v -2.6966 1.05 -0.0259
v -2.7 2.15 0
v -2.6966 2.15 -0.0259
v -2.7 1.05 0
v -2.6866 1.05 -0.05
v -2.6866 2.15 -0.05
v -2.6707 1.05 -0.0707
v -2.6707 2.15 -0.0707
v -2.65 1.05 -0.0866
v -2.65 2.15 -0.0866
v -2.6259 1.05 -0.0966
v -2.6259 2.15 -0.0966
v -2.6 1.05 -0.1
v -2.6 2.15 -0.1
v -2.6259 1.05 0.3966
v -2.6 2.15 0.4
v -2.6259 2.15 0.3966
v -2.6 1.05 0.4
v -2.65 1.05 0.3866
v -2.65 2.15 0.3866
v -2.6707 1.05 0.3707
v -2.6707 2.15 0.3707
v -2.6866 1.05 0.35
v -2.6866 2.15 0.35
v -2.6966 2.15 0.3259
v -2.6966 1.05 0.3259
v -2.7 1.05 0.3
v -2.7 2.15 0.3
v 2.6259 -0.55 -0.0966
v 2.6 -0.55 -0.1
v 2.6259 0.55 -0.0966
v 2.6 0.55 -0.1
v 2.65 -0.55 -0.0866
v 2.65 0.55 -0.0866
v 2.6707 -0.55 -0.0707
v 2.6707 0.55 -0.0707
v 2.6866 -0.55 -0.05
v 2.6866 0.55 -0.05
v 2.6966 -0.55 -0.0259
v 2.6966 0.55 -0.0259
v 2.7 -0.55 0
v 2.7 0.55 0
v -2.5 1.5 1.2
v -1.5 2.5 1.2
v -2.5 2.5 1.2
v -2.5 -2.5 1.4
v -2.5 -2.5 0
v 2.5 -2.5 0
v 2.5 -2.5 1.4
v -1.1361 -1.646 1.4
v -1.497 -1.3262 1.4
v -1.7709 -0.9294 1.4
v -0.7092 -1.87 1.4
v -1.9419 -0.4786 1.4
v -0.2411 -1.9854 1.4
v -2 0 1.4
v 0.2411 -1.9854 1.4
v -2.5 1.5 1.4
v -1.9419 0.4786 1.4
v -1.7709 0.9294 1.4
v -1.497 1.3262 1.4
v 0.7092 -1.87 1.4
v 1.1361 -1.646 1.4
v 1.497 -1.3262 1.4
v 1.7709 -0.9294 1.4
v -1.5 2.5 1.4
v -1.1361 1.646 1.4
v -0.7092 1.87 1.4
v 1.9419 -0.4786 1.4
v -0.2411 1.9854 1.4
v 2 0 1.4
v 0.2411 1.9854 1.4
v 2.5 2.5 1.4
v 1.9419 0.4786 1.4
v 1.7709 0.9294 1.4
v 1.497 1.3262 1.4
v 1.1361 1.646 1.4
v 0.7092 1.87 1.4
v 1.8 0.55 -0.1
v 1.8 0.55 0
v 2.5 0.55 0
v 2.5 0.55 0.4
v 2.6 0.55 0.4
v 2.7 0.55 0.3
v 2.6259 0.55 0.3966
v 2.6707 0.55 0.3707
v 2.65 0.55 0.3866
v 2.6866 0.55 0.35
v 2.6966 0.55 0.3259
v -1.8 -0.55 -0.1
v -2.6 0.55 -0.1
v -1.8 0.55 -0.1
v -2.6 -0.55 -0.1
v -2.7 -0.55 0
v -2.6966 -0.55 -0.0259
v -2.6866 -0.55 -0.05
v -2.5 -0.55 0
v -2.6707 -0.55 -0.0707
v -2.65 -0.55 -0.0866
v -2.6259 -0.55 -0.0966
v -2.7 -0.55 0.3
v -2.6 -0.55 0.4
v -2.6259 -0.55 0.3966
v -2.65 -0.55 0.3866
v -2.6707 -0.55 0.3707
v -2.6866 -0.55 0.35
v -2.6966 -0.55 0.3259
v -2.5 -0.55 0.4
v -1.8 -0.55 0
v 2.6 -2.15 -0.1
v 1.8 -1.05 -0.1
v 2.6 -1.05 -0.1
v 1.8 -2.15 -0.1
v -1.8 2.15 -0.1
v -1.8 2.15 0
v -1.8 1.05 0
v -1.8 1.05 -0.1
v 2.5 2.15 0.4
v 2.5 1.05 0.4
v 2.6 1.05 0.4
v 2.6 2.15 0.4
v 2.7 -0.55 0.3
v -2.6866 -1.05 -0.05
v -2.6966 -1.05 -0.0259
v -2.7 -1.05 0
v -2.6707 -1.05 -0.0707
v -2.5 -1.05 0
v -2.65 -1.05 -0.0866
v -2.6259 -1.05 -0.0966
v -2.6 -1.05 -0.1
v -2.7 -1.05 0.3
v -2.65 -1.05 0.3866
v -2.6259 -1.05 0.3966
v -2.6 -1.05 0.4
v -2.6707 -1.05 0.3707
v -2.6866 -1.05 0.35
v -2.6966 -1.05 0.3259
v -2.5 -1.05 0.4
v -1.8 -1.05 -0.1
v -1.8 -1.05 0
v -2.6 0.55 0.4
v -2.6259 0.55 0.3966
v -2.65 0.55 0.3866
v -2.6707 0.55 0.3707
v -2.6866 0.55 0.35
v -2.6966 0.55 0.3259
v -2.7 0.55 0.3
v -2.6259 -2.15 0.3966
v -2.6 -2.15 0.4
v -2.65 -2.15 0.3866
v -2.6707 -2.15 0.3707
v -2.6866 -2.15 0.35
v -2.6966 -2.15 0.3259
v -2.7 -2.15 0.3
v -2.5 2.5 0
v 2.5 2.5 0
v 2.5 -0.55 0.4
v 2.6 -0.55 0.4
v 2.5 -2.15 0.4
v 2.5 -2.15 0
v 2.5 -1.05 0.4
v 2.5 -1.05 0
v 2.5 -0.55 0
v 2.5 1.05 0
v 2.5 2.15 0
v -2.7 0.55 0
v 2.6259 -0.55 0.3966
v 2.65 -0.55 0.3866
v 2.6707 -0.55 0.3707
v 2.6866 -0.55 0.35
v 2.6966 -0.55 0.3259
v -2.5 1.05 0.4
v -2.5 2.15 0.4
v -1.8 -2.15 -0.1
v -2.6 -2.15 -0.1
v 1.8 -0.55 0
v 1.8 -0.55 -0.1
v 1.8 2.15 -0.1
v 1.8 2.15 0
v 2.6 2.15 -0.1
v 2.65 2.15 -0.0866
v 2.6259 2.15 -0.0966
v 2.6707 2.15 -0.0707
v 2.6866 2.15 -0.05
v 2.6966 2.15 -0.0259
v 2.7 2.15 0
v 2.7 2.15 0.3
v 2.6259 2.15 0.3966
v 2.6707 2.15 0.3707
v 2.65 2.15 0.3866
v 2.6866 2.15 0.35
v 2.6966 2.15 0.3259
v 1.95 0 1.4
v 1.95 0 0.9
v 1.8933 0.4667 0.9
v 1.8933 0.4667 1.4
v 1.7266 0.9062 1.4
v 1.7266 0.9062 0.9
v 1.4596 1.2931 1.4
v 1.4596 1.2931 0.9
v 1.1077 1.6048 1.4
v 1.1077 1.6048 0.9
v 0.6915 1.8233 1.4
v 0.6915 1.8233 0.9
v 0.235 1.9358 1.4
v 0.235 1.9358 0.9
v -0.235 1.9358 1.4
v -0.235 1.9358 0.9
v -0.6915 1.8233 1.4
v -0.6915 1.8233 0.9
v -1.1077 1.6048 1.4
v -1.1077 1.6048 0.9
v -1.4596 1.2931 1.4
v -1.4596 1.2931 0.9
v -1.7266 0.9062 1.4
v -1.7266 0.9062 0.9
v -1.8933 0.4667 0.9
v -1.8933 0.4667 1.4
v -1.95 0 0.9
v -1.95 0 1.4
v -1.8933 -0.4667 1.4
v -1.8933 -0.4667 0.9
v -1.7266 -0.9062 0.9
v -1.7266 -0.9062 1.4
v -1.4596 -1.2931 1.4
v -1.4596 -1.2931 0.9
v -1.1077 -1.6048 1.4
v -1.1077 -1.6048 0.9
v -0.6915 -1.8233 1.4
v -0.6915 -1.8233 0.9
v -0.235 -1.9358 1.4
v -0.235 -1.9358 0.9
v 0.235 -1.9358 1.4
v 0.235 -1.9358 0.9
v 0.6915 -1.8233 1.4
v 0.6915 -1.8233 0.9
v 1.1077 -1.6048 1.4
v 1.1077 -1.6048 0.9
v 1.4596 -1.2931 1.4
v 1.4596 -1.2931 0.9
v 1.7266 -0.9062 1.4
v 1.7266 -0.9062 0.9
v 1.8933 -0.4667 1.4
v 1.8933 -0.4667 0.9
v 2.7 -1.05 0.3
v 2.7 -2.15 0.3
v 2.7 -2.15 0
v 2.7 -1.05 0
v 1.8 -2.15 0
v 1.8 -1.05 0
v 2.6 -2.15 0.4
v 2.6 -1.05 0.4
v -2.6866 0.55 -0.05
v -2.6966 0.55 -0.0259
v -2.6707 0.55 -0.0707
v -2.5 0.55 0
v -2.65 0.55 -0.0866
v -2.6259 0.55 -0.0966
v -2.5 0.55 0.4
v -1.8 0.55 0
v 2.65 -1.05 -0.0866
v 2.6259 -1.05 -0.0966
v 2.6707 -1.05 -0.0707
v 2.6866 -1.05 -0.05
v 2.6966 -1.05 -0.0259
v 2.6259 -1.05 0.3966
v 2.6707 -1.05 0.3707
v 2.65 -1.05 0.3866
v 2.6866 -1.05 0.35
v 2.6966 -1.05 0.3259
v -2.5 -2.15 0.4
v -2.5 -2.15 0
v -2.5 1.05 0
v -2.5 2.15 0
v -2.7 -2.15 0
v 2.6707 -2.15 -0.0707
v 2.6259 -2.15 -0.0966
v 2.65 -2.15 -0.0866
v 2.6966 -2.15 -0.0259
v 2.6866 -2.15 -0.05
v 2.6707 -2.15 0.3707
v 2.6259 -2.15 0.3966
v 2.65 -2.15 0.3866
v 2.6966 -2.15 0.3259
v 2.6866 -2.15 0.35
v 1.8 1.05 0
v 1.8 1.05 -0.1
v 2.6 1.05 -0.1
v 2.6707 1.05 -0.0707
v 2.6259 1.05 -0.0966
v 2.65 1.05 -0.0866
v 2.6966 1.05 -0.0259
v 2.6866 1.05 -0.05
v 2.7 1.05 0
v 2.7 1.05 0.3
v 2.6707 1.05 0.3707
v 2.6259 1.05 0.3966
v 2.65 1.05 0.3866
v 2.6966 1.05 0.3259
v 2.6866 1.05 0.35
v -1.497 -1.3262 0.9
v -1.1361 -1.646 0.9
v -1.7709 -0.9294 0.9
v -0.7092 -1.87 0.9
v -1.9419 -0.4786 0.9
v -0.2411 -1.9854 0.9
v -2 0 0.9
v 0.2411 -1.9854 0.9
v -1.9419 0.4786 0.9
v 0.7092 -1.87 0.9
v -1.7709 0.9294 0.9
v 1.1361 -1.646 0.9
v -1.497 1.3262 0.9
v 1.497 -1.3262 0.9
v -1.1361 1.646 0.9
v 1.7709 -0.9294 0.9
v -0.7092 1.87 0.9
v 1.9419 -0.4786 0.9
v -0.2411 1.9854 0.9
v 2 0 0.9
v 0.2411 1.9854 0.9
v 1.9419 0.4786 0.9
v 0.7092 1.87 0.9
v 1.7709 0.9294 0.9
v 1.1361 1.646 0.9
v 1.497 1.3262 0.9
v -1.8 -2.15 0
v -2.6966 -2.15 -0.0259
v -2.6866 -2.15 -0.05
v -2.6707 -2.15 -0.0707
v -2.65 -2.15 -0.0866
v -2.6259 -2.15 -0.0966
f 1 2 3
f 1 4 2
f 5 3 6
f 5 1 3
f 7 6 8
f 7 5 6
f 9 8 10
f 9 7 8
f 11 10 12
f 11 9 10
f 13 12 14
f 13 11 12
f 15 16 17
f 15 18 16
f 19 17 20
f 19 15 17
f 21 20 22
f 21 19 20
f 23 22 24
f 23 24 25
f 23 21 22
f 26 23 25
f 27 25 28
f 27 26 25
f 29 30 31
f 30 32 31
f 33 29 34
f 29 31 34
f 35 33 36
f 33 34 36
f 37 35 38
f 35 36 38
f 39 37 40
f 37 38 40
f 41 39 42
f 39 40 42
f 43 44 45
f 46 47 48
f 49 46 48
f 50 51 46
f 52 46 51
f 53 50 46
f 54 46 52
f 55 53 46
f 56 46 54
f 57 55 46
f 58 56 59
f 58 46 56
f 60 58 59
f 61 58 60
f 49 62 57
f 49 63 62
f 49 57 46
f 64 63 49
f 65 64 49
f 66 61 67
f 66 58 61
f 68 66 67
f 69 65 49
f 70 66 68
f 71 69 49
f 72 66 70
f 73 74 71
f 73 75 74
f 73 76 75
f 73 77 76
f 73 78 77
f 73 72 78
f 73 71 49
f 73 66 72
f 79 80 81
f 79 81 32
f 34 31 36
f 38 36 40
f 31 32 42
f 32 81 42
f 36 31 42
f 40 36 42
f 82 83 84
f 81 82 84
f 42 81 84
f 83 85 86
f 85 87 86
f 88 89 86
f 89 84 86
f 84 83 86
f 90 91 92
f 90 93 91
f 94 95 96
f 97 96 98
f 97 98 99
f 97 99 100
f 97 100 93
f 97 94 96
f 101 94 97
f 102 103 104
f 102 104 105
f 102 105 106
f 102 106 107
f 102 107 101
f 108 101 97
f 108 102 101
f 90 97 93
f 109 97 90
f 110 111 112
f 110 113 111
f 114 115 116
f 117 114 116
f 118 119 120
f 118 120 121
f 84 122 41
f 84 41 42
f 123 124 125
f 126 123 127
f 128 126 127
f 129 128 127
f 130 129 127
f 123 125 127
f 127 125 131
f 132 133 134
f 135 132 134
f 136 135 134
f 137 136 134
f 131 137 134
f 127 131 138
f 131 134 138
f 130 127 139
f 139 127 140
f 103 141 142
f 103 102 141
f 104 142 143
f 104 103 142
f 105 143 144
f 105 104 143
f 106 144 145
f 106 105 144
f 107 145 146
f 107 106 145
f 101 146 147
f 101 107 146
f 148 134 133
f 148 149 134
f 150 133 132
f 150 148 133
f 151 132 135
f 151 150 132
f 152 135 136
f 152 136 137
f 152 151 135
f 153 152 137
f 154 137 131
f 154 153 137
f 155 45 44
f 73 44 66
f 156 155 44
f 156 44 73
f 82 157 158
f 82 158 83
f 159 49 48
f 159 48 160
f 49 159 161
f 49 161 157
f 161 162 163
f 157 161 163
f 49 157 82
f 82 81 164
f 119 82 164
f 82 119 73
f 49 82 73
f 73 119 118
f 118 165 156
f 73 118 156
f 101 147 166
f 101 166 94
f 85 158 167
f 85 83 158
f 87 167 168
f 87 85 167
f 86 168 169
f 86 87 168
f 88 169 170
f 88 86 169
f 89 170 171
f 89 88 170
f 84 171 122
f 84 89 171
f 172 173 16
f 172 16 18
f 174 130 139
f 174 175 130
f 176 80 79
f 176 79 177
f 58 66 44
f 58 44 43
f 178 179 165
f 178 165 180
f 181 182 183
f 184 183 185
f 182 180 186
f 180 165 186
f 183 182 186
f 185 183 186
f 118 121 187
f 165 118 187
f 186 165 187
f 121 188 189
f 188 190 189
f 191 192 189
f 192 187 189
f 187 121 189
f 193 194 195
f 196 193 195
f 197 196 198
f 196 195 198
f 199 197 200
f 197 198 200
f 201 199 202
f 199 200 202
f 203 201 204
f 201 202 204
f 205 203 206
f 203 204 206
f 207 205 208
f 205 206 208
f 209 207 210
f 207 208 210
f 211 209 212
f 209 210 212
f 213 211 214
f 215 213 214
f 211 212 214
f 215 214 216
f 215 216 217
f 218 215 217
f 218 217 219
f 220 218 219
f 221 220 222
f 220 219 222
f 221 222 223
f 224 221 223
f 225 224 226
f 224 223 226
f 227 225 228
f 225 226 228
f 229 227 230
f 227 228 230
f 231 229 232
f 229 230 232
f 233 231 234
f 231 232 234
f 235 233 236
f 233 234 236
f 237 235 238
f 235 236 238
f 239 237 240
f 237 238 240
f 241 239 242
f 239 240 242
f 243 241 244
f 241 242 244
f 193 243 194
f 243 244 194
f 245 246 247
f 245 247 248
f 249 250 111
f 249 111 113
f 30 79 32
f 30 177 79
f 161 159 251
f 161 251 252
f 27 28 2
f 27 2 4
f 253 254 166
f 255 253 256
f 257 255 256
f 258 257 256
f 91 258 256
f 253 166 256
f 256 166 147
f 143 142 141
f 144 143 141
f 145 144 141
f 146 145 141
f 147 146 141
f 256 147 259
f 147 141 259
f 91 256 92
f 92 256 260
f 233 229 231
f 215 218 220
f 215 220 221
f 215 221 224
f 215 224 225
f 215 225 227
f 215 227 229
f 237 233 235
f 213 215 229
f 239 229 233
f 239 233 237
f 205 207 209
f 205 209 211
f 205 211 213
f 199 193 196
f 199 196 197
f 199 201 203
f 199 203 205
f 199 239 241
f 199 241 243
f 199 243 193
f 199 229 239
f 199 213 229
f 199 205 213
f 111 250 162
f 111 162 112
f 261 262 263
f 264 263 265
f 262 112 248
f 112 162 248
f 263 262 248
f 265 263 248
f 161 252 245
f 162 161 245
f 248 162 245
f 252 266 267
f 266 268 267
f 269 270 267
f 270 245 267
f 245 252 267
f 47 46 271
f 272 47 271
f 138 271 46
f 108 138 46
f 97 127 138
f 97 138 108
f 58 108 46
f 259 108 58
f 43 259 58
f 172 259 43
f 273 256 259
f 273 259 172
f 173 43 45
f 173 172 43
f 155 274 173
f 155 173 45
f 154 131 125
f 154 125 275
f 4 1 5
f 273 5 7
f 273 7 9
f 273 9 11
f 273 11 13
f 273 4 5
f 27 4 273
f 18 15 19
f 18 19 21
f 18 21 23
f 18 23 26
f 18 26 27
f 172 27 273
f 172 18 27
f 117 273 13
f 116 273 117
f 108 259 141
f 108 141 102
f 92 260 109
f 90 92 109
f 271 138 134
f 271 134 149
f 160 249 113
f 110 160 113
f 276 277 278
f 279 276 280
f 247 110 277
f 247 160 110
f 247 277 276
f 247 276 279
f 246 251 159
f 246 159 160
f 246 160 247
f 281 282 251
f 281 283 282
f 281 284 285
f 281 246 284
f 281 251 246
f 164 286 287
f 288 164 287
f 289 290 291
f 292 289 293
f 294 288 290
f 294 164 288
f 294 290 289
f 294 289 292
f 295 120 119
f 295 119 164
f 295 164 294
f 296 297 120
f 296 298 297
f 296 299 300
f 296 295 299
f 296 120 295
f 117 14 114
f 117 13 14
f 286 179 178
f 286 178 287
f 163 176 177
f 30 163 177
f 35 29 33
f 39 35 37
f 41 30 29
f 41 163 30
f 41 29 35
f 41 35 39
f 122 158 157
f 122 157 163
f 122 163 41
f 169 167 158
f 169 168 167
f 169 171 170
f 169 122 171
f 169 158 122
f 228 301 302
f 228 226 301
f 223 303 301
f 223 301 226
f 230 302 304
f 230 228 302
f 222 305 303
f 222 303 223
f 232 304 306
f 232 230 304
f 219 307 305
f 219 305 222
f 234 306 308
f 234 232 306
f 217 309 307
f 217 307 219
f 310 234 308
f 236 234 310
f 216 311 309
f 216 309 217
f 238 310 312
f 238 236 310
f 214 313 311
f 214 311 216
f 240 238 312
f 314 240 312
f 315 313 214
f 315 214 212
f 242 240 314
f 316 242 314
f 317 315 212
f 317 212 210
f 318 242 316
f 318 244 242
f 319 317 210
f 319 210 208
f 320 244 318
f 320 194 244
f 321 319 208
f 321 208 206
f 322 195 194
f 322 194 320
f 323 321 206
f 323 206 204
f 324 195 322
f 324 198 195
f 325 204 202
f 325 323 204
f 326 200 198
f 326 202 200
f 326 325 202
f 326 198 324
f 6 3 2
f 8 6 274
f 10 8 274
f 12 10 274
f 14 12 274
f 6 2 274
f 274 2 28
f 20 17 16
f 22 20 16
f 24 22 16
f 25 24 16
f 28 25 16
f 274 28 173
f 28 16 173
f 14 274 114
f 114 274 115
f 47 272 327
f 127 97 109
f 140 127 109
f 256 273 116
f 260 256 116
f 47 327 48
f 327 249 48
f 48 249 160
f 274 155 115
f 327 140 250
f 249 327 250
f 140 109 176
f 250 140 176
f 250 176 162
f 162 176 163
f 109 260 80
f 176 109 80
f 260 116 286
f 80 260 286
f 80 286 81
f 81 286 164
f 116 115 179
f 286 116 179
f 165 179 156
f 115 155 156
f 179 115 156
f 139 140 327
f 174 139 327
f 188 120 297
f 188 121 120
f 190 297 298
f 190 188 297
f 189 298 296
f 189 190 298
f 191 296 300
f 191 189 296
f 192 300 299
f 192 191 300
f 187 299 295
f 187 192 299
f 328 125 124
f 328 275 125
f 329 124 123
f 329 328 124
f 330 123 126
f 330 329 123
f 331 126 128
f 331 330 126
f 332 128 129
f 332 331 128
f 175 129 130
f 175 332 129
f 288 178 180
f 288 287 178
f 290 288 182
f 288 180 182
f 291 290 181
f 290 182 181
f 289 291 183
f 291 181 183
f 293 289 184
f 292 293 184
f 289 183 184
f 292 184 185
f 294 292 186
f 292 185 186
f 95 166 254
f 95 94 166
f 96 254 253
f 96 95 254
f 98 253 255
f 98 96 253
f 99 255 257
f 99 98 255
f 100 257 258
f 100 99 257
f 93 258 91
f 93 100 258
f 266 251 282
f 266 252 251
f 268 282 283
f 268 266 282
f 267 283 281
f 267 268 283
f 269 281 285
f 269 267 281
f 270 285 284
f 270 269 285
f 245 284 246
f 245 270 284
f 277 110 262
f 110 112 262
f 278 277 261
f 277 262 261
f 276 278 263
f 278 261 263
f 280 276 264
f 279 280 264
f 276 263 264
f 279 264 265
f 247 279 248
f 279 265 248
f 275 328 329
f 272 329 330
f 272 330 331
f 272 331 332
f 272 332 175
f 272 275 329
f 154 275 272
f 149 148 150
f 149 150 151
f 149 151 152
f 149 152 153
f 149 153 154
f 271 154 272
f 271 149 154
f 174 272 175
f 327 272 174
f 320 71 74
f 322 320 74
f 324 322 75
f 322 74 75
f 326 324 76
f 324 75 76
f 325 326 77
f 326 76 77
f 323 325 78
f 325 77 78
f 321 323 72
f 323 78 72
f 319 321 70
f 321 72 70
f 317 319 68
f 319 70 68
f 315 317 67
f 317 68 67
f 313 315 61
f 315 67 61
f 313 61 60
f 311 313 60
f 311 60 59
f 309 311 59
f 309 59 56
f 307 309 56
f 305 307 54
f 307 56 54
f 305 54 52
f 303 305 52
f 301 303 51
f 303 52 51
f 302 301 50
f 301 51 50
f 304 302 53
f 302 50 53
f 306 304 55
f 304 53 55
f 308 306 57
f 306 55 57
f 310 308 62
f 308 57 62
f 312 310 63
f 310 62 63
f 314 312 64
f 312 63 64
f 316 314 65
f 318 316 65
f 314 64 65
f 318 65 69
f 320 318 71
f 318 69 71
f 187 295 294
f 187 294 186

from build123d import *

# Parameters (mm, degrees)
SKETCH_W        = 5
SKETCH_H        = 5
PAD_DEPTH       = 1.4
SKETCH001_R     = 2
POCKET_DEPTH    = 0.5
SKETCH002_W     = 1.1
SKETCH002_H     = 0.5
PAD001_DEPTH    = 0.2
SKETCH003_W     = 1.1
SKETCH003_H     = 0.5
PAD002_DEPTH    = 0.2
SKETCH004_W     = 0.7
SKETCH004_H     = 1.1
PAD003_DEPTH    = 0.1
SKETCH005_R     = 1.95
PAD004_DEPTH    = 0.5
POCKET001_DEPTH = 0.2
FILLET_R        = 0.1


with BuildPart() as part:
    # Sketch → Pad (new body)
    with BuildSketch(Plane.XY):
        Rectangle(SKETCH_W, SKETCH_H)
    extrude(amount=PAD_DEPTH)

    # Sketch001 (on Face6 of Pad) → Pocket (cut)
    with BuildSketch(Plane.XY.offset(1.4)):
        Circle(SKETCH001_R)
    extrude(amount=-POCKET_DEPTH, mode=Mode.SUBTRACT)

    # Sketch002 (on Face2 of Pocket) → Pad001 (join)
    with BuildSketch(Plane(origin=(-2.5, 0, 0), x_dir=(0, -1, 0), z_dir=(-1, 0, 0))):
        with Locations((0, 0.15)):
            Rectangle(SKETCH002_W, SKETCH002_H)
        with Locations((1.6, 0.15)):
            Rectangle(SKETCH002_W, SKETCH002_H)
        with Locations((-1.6, 0.15)):
            Rectangle(SKETCH002_W, SKETCH002_H)
    extrude(amount=PAD001_DEPTH)

    # Sketch003 (on Face3 of Pad001) → Pad002 (join)
    with BuildSketch(Plane.YZ.offset(2.5)):
        with Locations((-1.6, 0.15)):
            Rectangle(SKETCH003_W, SKETCH003_H)
        with Locations((0, 0.15)):
            Rectangle(SKETCH003_W, SKETCH003_H)
        with Locations((1.6, 0.15)):
            Rectangle(SKETCH003_W, SKETCH003_H)
    extrude(amount=PAD002_DEPTH)

    # Sketch004 (on Face4 of Pad002) → Pad003 (join)
    with BuildSketch(Plane(origin=(0, 0, 0), x_dir=(1, 0, 0), z_dir=(0, 0, -1))):
        with Locations((-2.15, 1.6)):
            Rectangle(SKETCH004_W, SKETCH004_H)
        with Locations((-2.15, 0)):
            Rectangle(SKETCH004_W, SKETCH004_H)
        with Locations((-2.15, -1.6)):
            Rectangle(SKETCH004_W, SKETCH004_H)
        with Locations((2.15, 1.6)):
            Rectangle(SKETCH004_W, SKETCH004_H)
        with Locations((2.15, 0)):
            Rectangle(SKETCH004_W, SKETCH004_H)
        with Locations((2.15, -1.6)):
            Rectangle(SKETCH004_W, SKETCH004_H)
    extrude(amount=PAD003_DEPTH)

    # Sketch005 (on Face26 of Pad003) → Pad004 (join)
    with BuildSketch(Plane.XY.offset(0.9)):
        Circle(SKETCH005_R)
    extrude(amount=PAD004_DEPTH)

    # Sketch006 (on Face5 of Pad004) → Pocket001 (cut)
    with BuildSketch(Plane.XY.offset(1.4)):
        Polygon((-2.5, 2.5), (-1.5, 2.5), (-2.5, 1.5), align=None)
    extrude(amount=-POCKET001_DEPTH, mode=Mode.SUBTRACT)

    # Fillet
    fillet_edges = [part.edges().sort_by_distance(p)[0] for p in [
        (2.7, 1.6, 0.4),
        (2.7, 0, 0.4),
        (2.7, -1.6, 0.4),
        (-2.7, 1.6, 0.4),
        (-2.7, 0, 0.4),
        (-2.7, -1.6, 0.4),
        (-2.7, -1.6, -0.1),
        (-2.7, 0, -0.1),
        (-2.7, 1.6, -0.1),
        (2.7, 1.6, -0.1),
        (2.7, 0, -0.1),
        (2.7, -1.6, -0.1),
    ]]
    fillet(fillet_edges, radius=FILLET_R)


solid = part.part
